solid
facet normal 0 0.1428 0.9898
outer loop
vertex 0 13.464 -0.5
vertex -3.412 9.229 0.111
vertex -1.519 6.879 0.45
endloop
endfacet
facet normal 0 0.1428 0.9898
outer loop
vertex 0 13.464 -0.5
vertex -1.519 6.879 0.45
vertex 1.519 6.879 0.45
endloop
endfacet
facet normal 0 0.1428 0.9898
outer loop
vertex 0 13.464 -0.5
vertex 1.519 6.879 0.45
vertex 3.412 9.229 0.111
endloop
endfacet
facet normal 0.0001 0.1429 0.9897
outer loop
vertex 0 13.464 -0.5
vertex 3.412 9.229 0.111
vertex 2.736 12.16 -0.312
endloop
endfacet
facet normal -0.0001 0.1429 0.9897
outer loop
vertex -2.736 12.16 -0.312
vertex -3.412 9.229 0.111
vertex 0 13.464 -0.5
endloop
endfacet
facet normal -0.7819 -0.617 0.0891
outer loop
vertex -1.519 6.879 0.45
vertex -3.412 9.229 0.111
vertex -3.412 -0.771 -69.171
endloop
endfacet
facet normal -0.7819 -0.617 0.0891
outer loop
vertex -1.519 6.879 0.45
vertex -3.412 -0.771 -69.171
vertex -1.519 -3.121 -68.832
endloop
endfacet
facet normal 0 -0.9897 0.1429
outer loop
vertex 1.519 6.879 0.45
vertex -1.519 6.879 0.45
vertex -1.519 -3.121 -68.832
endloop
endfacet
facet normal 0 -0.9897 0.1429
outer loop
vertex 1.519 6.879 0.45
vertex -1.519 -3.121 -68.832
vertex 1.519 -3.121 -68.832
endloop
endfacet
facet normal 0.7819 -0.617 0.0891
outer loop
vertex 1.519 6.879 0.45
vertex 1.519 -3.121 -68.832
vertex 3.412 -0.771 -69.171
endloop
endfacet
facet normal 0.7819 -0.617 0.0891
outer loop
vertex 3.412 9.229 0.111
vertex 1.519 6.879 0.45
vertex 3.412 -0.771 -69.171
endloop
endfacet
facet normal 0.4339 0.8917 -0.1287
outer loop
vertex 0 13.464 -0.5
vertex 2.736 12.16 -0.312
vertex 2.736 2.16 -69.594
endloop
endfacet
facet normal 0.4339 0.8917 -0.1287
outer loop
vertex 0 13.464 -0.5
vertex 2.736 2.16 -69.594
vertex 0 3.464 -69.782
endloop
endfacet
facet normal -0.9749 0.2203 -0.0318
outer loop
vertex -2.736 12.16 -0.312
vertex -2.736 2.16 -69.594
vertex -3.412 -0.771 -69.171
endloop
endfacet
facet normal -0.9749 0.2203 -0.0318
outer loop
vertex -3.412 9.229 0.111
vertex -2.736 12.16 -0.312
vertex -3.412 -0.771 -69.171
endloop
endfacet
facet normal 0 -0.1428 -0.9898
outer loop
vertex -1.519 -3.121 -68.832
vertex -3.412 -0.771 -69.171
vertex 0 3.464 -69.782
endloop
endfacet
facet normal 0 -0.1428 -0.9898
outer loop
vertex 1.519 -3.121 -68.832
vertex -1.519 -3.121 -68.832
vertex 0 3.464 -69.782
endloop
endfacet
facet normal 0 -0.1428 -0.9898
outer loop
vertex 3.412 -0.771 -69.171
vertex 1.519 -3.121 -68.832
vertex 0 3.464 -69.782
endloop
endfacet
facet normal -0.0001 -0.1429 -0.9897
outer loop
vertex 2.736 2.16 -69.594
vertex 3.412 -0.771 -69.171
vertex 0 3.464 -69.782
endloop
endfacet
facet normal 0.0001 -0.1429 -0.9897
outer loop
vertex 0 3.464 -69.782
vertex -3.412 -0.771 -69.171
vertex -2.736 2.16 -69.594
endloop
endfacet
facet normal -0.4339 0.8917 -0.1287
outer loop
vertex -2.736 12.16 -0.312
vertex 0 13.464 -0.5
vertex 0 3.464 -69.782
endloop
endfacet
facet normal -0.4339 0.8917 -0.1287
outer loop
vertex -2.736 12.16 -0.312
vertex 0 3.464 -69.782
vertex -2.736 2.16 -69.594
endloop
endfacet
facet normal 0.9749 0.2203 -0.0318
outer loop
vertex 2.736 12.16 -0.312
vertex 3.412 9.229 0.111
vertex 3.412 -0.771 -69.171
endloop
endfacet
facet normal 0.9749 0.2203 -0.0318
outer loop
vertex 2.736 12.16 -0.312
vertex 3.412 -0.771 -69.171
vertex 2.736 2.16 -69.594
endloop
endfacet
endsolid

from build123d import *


with BuildPart() as part:
    # Sweep1: sweep along a path in Sketch1
    with BuildLine(Plane(origin=(0, 0, 0), x_dir=(0, 0, -1), z_dir=(1, 0, 0))) as sweep1_path:
        Line((69.282032303, 0), (0, 10))
    # Sketch2 → Sweep1 (sweep)
    with BuildSketch(Plane(origin=(0, 0, -69.282032303), x_dir=(1, 0, 0), z_dir=(0, 0.14285714285714282, 0.989743318610787))):
        Polygon((0, 3.5), (-2.736410189, 2.182214307), (-3.412247693, -0.778823269), (-1.518593087, -3.153391038), (1.518593087, -3.153391038), (3.412247693, -0.778823269), (2.736410189, 2.182214307), align=None)
    sweep(path=sweep1_path.line)


solid = part.part
